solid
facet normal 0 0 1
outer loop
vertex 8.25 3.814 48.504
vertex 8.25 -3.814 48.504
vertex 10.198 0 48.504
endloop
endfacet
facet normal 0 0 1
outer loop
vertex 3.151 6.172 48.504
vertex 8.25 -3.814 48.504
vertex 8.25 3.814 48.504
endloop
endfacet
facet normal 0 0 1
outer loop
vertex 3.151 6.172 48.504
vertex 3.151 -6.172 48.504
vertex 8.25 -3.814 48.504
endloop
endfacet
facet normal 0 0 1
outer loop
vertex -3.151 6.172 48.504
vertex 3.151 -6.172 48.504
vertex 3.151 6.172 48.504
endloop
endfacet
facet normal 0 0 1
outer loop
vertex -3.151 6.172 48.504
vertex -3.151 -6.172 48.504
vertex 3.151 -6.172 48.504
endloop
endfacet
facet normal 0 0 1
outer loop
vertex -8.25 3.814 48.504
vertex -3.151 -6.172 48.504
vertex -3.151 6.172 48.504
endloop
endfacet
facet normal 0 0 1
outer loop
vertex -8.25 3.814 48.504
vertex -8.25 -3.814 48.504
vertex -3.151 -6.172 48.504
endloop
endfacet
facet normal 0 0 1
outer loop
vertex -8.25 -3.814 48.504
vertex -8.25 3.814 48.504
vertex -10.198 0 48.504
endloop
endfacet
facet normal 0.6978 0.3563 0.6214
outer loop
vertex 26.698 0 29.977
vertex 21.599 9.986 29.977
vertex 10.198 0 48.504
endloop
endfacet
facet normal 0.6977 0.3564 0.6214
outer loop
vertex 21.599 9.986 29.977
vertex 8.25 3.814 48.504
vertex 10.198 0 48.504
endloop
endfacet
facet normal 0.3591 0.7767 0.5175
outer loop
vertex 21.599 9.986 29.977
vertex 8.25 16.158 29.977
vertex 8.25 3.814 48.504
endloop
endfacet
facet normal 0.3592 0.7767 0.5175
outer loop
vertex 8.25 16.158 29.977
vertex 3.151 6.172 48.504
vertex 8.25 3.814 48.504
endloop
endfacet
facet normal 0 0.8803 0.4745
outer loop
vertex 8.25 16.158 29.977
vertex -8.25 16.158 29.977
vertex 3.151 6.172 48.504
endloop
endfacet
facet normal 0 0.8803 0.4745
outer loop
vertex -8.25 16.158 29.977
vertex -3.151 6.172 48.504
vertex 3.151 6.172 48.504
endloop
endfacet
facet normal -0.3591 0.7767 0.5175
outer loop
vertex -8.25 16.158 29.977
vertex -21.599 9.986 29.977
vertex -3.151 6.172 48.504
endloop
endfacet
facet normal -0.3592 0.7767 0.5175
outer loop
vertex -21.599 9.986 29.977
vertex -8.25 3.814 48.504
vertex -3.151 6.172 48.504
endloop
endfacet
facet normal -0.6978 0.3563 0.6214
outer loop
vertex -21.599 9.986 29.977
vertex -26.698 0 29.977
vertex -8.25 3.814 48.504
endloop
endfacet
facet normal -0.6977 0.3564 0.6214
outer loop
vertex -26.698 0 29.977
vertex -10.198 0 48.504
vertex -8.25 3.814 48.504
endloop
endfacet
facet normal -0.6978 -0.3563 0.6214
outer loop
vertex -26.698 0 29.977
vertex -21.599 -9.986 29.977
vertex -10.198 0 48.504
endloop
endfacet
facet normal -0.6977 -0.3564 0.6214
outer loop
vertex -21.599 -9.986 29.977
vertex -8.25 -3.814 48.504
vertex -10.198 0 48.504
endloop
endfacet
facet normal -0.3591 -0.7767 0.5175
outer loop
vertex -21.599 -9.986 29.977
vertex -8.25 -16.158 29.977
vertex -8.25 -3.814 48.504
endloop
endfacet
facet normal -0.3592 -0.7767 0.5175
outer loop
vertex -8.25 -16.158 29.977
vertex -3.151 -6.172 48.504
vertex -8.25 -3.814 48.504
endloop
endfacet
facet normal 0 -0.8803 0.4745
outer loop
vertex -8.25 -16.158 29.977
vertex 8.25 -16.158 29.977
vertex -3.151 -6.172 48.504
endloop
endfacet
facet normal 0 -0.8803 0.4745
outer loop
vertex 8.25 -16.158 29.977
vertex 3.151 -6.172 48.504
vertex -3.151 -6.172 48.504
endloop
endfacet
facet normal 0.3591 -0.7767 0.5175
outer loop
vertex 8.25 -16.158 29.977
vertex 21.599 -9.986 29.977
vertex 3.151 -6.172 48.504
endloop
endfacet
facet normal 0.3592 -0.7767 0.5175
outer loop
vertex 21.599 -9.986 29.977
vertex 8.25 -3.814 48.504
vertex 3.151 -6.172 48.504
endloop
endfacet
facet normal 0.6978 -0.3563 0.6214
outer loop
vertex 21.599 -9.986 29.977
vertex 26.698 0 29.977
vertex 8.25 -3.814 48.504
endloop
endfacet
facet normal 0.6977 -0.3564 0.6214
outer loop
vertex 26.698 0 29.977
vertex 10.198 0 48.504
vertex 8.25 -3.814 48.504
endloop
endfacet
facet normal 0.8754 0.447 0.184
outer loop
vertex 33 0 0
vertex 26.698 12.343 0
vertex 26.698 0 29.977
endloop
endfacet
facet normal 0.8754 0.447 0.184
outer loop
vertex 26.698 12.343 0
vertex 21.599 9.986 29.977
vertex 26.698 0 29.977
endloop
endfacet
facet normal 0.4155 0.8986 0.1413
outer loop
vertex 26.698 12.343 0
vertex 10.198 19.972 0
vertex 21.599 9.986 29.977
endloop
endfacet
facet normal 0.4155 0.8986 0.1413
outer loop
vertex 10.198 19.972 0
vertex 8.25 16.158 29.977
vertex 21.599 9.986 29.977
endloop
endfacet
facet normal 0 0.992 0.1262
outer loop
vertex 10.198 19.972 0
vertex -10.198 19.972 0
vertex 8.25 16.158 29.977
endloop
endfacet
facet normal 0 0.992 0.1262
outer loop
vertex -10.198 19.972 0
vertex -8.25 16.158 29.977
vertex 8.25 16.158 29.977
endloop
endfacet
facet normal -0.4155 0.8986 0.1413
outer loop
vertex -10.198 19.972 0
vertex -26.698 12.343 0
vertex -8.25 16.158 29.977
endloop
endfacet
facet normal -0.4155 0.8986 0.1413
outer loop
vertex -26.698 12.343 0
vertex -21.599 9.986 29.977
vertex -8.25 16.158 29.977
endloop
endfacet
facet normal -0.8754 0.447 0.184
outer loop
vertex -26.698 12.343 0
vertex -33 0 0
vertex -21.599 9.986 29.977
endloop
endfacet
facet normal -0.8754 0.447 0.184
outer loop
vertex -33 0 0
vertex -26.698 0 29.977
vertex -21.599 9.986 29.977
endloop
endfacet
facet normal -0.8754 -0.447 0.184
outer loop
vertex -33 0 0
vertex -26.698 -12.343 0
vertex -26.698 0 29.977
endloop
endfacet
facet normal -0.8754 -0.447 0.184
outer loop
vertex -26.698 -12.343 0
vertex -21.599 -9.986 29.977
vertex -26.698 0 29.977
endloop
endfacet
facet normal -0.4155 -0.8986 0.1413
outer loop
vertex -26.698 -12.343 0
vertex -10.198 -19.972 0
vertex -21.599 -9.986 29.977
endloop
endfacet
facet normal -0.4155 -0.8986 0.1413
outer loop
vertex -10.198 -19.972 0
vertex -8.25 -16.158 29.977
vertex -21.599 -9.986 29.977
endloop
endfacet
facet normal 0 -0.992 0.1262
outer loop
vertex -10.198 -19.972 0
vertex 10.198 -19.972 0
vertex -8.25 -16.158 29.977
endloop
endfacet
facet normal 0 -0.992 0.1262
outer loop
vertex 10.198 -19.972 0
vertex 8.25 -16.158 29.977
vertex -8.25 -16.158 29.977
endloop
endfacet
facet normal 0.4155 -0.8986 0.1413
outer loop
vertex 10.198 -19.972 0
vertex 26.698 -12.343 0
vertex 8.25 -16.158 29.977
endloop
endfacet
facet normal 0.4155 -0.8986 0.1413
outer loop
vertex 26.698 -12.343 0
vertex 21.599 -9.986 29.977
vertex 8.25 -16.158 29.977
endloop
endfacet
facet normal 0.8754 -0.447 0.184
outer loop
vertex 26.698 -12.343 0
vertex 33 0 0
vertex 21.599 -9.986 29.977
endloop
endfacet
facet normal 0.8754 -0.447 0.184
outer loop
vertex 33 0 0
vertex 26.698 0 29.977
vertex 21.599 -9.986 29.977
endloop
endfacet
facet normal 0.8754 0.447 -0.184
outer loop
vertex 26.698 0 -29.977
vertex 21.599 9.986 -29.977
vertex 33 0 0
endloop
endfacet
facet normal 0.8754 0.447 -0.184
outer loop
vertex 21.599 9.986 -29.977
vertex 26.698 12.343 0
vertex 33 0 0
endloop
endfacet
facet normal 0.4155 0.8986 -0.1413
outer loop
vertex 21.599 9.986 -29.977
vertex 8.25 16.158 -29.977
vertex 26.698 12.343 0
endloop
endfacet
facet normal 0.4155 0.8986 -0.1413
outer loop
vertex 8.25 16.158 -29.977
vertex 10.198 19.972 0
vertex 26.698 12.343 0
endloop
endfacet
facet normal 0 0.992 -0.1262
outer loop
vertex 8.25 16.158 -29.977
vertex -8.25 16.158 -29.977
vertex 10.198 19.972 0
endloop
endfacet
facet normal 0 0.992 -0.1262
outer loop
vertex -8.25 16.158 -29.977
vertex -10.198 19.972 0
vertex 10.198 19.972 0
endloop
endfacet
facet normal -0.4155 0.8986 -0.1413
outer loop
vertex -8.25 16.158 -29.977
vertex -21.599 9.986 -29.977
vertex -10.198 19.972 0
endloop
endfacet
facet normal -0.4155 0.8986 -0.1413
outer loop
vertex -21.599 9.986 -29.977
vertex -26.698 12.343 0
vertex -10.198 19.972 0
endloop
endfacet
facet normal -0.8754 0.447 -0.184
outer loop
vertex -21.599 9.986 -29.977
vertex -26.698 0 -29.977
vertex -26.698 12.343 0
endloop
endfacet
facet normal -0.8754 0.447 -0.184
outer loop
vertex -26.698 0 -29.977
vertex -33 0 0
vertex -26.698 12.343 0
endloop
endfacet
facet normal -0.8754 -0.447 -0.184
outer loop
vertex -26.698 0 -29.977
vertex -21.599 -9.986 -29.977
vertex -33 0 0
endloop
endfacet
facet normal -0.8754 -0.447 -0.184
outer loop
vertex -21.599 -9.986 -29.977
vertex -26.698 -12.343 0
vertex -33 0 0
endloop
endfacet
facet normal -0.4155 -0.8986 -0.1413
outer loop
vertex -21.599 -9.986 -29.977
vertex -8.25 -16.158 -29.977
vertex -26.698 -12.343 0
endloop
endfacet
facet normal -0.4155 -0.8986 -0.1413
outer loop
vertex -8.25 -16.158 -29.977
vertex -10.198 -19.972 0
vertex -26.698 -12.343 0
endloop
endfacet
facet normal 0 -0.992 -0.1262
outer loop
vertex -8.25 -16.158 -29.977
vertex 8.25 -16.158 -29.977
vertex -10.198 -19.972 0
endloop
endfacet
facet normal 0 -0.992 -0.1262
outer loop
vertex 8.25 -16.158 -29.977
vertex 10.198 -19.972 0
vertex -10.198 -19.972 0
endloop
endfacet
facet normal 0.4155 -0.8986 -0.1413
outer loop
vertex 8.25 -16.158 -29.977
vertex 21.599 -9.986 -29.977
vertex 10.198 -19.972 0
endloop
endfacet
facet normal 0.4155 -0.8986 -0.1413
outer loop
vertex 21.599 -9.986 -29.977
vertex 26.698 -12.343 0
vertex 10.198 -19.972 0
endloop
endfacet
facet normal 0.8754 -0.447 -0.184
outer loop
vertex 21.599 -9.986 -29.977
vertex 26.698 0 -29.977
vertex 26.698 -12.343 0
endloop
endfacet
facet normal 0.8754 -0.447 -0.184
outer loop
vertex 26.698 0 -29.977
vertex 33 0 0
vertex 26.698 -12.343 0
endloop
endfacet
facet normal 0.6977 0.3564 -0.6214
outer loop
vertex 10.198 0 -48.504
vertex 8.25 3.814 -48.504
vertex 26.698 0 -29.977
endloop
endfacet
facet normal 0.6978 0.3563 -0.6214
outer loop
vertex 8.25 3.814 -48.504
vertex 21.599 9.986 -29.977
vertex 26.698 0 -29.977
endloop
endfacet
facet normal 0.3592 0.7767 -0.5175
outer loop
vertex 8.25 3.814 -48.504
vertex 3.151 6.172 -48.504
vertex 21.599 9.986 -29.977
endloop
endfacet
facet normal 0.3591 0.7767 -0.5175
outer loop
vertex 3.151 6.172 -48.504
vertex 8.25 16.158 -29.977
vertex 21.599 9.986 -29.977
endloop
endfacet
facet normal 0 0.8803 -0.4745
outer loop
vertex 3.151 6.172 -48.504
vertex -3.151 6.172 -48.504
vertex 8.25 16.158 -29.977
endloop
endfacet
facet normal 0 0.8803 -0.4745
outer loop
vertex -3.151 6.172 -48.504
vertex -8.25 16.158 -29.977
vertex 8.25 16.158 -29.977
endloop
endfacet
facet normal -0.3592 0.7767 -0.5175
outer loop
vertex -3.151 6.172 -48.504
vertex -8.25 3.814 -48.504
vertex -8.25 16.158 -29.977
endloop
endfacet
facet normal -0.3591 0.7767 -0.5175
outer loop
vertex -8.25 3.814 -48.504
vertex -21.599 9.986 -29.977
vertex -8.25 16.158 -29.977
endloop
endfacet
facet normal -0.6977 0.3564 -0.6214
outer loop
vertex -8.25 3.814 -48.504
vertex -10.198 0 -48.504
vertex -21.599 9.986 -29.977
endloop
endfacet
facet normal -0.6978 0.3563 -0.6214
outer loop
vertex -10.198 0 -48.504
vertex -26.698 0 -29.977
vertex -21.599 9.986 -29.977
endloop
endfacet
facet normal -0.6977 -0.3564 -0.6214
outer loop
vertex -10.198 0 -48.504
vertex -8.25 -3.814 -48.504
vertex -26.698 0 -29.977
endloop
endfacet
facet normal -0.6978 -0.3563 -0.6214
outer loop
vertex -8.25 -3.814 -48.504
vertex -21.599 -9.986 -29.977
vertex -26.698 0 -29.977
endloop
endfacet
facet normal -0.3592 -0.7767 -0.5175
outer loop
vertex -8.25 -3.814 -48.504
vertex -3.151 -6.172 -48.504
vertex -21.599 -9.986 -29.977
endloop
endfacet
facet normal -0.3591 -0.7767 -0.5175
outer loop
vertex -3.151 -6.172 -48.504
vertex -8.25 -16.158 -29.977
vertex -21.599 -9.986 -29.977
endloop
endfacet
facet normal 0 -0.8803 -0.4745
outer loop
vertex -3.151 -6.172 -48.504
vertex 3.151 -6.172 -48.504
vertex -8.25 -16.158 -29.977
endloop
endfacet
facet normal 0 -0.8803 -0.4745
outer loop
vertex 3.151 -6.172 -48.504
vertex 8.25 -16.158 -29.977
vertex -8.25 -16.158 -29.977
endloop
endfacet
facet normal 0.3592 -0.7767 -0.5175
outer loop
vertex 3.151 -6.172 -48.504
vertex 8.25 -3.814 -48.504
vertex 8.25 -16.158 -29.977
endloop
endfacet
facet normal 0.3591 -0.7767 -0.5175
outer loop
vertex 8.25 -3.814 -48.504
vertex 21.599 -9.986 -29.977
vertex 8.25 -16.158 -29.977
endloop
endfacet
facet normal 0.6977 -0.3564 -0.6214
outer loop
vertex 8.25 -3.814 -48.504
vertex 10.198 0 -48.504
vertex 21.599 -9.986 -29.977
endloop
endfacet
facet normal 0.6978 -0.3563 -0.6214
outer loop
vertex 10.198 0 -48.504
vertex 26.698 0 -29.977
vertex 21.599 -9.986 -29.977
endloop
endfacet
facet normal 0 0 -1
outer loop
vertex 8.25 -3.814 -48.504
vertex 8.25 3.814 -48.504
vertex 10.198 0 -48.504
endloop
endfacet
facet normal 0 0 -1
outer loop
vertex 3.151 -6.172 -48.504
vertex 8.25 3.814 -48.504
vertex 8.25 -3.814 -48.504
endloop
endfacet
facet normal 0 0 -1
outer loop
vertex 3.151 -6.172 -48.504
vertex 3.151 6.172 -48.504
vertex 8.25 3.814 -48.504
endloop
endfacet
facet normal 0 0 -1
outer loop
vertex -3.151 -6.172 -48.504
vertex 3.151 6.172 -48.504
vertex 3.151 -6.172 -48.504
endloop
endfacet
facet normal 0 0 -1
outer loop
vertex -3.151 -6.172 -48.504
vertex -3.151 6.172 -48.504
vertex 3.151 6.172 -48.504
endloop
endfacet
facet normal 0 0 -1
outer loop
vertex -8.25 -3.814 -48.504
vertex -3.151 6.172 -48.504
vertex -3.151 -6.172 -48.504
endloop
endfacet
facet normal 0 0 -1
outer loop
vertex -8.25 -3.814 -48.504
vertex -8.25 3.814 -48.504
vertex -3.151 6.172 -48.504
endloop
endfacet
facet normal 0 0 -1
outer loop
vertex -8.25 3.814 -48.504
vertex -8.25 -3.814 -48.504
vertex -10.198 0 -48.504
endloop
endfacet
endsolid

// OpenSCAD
// Generated by SolidPython 1.0.1 on 2020-07-29 00:46:49


scale(v = [11, 7, 17]) {
	sphere(r = 3);
}
/***********************************************
*********      SolidPython code:      **********
************************************************
 
# import packages: SolidPython
from solid import *
from solid.utils import *
from itertools import chain, combinations, permutations


class Resize:

    def __init__(self, scad_file):
        self.scad_file = scad_file
        #self.scad_file = import_scad(scad_file)
        # cone/cylinder param:
        self.r1 = 0
        self.r2 = 0
        self.h = 0
        # rectangular prism param:
        self.w = 0
        self.l = 0
        # ellipse param:
        self.r = 0

    # import OpenScad code (file name corresponds to shape)


    # classify shape + parameters
    def assign(self, param1, param2, param3):
        if self.scad_file == 'cone.scad':
            self.r1 = param1
            self.r2 = param2
            self.h = param3
        elif self.scad_file == 'cylinder.scad':
            self.r1 = param1
            self.r2 = param2
            self.h = param3
        elif self.scad_file == 'rectangularPrism.scad':
            self.h = param1
            self.l = param2
            self.w = param3
        else:
            self.r = param1
            self.h = param2

    # resize parameters
    def iterate(self):
        x = range(3, 20, 2)
        i = 1
        if self.scad_file == 'cone.scad':
            tempList = list(permutations(x, 2))
            for temp in tempList:
                param1 = temp[0]
                param2 = temp[1]
                filepath = 'produced_scad_files/' + 'cone' + str(param1) + '_' + str(param2) + '_' + '.scad'
                scad_render_to_file(cylinder(h=param1, r1=param2, r2=0), filepath)

        elif self.scad_file == 'cylinder.scad':
            tempList = list(permutations(x, 3))
            for temp in tempList:
                param1 = temp[0]
                param2 = temp[1]
                filepath = 'produced_scad_files/' + 'cylinder' + str(param1) + '_' + str(param2) + '_' + '.scad'
                scad_render_to_file(cylinder(h=param1, r1=param2, r2=param2), filepath)

        elif self.scad_file == 'rectangularPrism.scad':
            tempList = list(permutations(x, 3))
            for temp in tempList:
                param1 = temp[0]
                param2 = temp[1]
                param3 = temp[2]
                filepath = 'produced_scad_files/' + 'rectangularPrism' + str(param1) + '_' + str(param2) + '_' + str(
                    param3) + '.scad'
                scad_render_to_file(cube(size=(param1, param2, param3)), filepath)

        elif self.scad_file == 'ellipse.scad':
            tempList = list(permutations(x, 4))
            for temp in tempList:
                param1 = temp[0]
                param2 = temp[1]
                param3 = temp[2]
                param4 = temp[3]
                filepath = 'produced_scad_files/' + 'ellipse' + str(param1) + '_' + str(param2) + '_' + str(param3) + '_' + str(param4) + '.scad'
                scad_render_to_file(scale([param1, param2, param3])(sphere(r=param4)), filepath)

    def render_to_scadfile(self):
        scad_render_to_file(scad, 'example.scad') 
 
************************************************/
